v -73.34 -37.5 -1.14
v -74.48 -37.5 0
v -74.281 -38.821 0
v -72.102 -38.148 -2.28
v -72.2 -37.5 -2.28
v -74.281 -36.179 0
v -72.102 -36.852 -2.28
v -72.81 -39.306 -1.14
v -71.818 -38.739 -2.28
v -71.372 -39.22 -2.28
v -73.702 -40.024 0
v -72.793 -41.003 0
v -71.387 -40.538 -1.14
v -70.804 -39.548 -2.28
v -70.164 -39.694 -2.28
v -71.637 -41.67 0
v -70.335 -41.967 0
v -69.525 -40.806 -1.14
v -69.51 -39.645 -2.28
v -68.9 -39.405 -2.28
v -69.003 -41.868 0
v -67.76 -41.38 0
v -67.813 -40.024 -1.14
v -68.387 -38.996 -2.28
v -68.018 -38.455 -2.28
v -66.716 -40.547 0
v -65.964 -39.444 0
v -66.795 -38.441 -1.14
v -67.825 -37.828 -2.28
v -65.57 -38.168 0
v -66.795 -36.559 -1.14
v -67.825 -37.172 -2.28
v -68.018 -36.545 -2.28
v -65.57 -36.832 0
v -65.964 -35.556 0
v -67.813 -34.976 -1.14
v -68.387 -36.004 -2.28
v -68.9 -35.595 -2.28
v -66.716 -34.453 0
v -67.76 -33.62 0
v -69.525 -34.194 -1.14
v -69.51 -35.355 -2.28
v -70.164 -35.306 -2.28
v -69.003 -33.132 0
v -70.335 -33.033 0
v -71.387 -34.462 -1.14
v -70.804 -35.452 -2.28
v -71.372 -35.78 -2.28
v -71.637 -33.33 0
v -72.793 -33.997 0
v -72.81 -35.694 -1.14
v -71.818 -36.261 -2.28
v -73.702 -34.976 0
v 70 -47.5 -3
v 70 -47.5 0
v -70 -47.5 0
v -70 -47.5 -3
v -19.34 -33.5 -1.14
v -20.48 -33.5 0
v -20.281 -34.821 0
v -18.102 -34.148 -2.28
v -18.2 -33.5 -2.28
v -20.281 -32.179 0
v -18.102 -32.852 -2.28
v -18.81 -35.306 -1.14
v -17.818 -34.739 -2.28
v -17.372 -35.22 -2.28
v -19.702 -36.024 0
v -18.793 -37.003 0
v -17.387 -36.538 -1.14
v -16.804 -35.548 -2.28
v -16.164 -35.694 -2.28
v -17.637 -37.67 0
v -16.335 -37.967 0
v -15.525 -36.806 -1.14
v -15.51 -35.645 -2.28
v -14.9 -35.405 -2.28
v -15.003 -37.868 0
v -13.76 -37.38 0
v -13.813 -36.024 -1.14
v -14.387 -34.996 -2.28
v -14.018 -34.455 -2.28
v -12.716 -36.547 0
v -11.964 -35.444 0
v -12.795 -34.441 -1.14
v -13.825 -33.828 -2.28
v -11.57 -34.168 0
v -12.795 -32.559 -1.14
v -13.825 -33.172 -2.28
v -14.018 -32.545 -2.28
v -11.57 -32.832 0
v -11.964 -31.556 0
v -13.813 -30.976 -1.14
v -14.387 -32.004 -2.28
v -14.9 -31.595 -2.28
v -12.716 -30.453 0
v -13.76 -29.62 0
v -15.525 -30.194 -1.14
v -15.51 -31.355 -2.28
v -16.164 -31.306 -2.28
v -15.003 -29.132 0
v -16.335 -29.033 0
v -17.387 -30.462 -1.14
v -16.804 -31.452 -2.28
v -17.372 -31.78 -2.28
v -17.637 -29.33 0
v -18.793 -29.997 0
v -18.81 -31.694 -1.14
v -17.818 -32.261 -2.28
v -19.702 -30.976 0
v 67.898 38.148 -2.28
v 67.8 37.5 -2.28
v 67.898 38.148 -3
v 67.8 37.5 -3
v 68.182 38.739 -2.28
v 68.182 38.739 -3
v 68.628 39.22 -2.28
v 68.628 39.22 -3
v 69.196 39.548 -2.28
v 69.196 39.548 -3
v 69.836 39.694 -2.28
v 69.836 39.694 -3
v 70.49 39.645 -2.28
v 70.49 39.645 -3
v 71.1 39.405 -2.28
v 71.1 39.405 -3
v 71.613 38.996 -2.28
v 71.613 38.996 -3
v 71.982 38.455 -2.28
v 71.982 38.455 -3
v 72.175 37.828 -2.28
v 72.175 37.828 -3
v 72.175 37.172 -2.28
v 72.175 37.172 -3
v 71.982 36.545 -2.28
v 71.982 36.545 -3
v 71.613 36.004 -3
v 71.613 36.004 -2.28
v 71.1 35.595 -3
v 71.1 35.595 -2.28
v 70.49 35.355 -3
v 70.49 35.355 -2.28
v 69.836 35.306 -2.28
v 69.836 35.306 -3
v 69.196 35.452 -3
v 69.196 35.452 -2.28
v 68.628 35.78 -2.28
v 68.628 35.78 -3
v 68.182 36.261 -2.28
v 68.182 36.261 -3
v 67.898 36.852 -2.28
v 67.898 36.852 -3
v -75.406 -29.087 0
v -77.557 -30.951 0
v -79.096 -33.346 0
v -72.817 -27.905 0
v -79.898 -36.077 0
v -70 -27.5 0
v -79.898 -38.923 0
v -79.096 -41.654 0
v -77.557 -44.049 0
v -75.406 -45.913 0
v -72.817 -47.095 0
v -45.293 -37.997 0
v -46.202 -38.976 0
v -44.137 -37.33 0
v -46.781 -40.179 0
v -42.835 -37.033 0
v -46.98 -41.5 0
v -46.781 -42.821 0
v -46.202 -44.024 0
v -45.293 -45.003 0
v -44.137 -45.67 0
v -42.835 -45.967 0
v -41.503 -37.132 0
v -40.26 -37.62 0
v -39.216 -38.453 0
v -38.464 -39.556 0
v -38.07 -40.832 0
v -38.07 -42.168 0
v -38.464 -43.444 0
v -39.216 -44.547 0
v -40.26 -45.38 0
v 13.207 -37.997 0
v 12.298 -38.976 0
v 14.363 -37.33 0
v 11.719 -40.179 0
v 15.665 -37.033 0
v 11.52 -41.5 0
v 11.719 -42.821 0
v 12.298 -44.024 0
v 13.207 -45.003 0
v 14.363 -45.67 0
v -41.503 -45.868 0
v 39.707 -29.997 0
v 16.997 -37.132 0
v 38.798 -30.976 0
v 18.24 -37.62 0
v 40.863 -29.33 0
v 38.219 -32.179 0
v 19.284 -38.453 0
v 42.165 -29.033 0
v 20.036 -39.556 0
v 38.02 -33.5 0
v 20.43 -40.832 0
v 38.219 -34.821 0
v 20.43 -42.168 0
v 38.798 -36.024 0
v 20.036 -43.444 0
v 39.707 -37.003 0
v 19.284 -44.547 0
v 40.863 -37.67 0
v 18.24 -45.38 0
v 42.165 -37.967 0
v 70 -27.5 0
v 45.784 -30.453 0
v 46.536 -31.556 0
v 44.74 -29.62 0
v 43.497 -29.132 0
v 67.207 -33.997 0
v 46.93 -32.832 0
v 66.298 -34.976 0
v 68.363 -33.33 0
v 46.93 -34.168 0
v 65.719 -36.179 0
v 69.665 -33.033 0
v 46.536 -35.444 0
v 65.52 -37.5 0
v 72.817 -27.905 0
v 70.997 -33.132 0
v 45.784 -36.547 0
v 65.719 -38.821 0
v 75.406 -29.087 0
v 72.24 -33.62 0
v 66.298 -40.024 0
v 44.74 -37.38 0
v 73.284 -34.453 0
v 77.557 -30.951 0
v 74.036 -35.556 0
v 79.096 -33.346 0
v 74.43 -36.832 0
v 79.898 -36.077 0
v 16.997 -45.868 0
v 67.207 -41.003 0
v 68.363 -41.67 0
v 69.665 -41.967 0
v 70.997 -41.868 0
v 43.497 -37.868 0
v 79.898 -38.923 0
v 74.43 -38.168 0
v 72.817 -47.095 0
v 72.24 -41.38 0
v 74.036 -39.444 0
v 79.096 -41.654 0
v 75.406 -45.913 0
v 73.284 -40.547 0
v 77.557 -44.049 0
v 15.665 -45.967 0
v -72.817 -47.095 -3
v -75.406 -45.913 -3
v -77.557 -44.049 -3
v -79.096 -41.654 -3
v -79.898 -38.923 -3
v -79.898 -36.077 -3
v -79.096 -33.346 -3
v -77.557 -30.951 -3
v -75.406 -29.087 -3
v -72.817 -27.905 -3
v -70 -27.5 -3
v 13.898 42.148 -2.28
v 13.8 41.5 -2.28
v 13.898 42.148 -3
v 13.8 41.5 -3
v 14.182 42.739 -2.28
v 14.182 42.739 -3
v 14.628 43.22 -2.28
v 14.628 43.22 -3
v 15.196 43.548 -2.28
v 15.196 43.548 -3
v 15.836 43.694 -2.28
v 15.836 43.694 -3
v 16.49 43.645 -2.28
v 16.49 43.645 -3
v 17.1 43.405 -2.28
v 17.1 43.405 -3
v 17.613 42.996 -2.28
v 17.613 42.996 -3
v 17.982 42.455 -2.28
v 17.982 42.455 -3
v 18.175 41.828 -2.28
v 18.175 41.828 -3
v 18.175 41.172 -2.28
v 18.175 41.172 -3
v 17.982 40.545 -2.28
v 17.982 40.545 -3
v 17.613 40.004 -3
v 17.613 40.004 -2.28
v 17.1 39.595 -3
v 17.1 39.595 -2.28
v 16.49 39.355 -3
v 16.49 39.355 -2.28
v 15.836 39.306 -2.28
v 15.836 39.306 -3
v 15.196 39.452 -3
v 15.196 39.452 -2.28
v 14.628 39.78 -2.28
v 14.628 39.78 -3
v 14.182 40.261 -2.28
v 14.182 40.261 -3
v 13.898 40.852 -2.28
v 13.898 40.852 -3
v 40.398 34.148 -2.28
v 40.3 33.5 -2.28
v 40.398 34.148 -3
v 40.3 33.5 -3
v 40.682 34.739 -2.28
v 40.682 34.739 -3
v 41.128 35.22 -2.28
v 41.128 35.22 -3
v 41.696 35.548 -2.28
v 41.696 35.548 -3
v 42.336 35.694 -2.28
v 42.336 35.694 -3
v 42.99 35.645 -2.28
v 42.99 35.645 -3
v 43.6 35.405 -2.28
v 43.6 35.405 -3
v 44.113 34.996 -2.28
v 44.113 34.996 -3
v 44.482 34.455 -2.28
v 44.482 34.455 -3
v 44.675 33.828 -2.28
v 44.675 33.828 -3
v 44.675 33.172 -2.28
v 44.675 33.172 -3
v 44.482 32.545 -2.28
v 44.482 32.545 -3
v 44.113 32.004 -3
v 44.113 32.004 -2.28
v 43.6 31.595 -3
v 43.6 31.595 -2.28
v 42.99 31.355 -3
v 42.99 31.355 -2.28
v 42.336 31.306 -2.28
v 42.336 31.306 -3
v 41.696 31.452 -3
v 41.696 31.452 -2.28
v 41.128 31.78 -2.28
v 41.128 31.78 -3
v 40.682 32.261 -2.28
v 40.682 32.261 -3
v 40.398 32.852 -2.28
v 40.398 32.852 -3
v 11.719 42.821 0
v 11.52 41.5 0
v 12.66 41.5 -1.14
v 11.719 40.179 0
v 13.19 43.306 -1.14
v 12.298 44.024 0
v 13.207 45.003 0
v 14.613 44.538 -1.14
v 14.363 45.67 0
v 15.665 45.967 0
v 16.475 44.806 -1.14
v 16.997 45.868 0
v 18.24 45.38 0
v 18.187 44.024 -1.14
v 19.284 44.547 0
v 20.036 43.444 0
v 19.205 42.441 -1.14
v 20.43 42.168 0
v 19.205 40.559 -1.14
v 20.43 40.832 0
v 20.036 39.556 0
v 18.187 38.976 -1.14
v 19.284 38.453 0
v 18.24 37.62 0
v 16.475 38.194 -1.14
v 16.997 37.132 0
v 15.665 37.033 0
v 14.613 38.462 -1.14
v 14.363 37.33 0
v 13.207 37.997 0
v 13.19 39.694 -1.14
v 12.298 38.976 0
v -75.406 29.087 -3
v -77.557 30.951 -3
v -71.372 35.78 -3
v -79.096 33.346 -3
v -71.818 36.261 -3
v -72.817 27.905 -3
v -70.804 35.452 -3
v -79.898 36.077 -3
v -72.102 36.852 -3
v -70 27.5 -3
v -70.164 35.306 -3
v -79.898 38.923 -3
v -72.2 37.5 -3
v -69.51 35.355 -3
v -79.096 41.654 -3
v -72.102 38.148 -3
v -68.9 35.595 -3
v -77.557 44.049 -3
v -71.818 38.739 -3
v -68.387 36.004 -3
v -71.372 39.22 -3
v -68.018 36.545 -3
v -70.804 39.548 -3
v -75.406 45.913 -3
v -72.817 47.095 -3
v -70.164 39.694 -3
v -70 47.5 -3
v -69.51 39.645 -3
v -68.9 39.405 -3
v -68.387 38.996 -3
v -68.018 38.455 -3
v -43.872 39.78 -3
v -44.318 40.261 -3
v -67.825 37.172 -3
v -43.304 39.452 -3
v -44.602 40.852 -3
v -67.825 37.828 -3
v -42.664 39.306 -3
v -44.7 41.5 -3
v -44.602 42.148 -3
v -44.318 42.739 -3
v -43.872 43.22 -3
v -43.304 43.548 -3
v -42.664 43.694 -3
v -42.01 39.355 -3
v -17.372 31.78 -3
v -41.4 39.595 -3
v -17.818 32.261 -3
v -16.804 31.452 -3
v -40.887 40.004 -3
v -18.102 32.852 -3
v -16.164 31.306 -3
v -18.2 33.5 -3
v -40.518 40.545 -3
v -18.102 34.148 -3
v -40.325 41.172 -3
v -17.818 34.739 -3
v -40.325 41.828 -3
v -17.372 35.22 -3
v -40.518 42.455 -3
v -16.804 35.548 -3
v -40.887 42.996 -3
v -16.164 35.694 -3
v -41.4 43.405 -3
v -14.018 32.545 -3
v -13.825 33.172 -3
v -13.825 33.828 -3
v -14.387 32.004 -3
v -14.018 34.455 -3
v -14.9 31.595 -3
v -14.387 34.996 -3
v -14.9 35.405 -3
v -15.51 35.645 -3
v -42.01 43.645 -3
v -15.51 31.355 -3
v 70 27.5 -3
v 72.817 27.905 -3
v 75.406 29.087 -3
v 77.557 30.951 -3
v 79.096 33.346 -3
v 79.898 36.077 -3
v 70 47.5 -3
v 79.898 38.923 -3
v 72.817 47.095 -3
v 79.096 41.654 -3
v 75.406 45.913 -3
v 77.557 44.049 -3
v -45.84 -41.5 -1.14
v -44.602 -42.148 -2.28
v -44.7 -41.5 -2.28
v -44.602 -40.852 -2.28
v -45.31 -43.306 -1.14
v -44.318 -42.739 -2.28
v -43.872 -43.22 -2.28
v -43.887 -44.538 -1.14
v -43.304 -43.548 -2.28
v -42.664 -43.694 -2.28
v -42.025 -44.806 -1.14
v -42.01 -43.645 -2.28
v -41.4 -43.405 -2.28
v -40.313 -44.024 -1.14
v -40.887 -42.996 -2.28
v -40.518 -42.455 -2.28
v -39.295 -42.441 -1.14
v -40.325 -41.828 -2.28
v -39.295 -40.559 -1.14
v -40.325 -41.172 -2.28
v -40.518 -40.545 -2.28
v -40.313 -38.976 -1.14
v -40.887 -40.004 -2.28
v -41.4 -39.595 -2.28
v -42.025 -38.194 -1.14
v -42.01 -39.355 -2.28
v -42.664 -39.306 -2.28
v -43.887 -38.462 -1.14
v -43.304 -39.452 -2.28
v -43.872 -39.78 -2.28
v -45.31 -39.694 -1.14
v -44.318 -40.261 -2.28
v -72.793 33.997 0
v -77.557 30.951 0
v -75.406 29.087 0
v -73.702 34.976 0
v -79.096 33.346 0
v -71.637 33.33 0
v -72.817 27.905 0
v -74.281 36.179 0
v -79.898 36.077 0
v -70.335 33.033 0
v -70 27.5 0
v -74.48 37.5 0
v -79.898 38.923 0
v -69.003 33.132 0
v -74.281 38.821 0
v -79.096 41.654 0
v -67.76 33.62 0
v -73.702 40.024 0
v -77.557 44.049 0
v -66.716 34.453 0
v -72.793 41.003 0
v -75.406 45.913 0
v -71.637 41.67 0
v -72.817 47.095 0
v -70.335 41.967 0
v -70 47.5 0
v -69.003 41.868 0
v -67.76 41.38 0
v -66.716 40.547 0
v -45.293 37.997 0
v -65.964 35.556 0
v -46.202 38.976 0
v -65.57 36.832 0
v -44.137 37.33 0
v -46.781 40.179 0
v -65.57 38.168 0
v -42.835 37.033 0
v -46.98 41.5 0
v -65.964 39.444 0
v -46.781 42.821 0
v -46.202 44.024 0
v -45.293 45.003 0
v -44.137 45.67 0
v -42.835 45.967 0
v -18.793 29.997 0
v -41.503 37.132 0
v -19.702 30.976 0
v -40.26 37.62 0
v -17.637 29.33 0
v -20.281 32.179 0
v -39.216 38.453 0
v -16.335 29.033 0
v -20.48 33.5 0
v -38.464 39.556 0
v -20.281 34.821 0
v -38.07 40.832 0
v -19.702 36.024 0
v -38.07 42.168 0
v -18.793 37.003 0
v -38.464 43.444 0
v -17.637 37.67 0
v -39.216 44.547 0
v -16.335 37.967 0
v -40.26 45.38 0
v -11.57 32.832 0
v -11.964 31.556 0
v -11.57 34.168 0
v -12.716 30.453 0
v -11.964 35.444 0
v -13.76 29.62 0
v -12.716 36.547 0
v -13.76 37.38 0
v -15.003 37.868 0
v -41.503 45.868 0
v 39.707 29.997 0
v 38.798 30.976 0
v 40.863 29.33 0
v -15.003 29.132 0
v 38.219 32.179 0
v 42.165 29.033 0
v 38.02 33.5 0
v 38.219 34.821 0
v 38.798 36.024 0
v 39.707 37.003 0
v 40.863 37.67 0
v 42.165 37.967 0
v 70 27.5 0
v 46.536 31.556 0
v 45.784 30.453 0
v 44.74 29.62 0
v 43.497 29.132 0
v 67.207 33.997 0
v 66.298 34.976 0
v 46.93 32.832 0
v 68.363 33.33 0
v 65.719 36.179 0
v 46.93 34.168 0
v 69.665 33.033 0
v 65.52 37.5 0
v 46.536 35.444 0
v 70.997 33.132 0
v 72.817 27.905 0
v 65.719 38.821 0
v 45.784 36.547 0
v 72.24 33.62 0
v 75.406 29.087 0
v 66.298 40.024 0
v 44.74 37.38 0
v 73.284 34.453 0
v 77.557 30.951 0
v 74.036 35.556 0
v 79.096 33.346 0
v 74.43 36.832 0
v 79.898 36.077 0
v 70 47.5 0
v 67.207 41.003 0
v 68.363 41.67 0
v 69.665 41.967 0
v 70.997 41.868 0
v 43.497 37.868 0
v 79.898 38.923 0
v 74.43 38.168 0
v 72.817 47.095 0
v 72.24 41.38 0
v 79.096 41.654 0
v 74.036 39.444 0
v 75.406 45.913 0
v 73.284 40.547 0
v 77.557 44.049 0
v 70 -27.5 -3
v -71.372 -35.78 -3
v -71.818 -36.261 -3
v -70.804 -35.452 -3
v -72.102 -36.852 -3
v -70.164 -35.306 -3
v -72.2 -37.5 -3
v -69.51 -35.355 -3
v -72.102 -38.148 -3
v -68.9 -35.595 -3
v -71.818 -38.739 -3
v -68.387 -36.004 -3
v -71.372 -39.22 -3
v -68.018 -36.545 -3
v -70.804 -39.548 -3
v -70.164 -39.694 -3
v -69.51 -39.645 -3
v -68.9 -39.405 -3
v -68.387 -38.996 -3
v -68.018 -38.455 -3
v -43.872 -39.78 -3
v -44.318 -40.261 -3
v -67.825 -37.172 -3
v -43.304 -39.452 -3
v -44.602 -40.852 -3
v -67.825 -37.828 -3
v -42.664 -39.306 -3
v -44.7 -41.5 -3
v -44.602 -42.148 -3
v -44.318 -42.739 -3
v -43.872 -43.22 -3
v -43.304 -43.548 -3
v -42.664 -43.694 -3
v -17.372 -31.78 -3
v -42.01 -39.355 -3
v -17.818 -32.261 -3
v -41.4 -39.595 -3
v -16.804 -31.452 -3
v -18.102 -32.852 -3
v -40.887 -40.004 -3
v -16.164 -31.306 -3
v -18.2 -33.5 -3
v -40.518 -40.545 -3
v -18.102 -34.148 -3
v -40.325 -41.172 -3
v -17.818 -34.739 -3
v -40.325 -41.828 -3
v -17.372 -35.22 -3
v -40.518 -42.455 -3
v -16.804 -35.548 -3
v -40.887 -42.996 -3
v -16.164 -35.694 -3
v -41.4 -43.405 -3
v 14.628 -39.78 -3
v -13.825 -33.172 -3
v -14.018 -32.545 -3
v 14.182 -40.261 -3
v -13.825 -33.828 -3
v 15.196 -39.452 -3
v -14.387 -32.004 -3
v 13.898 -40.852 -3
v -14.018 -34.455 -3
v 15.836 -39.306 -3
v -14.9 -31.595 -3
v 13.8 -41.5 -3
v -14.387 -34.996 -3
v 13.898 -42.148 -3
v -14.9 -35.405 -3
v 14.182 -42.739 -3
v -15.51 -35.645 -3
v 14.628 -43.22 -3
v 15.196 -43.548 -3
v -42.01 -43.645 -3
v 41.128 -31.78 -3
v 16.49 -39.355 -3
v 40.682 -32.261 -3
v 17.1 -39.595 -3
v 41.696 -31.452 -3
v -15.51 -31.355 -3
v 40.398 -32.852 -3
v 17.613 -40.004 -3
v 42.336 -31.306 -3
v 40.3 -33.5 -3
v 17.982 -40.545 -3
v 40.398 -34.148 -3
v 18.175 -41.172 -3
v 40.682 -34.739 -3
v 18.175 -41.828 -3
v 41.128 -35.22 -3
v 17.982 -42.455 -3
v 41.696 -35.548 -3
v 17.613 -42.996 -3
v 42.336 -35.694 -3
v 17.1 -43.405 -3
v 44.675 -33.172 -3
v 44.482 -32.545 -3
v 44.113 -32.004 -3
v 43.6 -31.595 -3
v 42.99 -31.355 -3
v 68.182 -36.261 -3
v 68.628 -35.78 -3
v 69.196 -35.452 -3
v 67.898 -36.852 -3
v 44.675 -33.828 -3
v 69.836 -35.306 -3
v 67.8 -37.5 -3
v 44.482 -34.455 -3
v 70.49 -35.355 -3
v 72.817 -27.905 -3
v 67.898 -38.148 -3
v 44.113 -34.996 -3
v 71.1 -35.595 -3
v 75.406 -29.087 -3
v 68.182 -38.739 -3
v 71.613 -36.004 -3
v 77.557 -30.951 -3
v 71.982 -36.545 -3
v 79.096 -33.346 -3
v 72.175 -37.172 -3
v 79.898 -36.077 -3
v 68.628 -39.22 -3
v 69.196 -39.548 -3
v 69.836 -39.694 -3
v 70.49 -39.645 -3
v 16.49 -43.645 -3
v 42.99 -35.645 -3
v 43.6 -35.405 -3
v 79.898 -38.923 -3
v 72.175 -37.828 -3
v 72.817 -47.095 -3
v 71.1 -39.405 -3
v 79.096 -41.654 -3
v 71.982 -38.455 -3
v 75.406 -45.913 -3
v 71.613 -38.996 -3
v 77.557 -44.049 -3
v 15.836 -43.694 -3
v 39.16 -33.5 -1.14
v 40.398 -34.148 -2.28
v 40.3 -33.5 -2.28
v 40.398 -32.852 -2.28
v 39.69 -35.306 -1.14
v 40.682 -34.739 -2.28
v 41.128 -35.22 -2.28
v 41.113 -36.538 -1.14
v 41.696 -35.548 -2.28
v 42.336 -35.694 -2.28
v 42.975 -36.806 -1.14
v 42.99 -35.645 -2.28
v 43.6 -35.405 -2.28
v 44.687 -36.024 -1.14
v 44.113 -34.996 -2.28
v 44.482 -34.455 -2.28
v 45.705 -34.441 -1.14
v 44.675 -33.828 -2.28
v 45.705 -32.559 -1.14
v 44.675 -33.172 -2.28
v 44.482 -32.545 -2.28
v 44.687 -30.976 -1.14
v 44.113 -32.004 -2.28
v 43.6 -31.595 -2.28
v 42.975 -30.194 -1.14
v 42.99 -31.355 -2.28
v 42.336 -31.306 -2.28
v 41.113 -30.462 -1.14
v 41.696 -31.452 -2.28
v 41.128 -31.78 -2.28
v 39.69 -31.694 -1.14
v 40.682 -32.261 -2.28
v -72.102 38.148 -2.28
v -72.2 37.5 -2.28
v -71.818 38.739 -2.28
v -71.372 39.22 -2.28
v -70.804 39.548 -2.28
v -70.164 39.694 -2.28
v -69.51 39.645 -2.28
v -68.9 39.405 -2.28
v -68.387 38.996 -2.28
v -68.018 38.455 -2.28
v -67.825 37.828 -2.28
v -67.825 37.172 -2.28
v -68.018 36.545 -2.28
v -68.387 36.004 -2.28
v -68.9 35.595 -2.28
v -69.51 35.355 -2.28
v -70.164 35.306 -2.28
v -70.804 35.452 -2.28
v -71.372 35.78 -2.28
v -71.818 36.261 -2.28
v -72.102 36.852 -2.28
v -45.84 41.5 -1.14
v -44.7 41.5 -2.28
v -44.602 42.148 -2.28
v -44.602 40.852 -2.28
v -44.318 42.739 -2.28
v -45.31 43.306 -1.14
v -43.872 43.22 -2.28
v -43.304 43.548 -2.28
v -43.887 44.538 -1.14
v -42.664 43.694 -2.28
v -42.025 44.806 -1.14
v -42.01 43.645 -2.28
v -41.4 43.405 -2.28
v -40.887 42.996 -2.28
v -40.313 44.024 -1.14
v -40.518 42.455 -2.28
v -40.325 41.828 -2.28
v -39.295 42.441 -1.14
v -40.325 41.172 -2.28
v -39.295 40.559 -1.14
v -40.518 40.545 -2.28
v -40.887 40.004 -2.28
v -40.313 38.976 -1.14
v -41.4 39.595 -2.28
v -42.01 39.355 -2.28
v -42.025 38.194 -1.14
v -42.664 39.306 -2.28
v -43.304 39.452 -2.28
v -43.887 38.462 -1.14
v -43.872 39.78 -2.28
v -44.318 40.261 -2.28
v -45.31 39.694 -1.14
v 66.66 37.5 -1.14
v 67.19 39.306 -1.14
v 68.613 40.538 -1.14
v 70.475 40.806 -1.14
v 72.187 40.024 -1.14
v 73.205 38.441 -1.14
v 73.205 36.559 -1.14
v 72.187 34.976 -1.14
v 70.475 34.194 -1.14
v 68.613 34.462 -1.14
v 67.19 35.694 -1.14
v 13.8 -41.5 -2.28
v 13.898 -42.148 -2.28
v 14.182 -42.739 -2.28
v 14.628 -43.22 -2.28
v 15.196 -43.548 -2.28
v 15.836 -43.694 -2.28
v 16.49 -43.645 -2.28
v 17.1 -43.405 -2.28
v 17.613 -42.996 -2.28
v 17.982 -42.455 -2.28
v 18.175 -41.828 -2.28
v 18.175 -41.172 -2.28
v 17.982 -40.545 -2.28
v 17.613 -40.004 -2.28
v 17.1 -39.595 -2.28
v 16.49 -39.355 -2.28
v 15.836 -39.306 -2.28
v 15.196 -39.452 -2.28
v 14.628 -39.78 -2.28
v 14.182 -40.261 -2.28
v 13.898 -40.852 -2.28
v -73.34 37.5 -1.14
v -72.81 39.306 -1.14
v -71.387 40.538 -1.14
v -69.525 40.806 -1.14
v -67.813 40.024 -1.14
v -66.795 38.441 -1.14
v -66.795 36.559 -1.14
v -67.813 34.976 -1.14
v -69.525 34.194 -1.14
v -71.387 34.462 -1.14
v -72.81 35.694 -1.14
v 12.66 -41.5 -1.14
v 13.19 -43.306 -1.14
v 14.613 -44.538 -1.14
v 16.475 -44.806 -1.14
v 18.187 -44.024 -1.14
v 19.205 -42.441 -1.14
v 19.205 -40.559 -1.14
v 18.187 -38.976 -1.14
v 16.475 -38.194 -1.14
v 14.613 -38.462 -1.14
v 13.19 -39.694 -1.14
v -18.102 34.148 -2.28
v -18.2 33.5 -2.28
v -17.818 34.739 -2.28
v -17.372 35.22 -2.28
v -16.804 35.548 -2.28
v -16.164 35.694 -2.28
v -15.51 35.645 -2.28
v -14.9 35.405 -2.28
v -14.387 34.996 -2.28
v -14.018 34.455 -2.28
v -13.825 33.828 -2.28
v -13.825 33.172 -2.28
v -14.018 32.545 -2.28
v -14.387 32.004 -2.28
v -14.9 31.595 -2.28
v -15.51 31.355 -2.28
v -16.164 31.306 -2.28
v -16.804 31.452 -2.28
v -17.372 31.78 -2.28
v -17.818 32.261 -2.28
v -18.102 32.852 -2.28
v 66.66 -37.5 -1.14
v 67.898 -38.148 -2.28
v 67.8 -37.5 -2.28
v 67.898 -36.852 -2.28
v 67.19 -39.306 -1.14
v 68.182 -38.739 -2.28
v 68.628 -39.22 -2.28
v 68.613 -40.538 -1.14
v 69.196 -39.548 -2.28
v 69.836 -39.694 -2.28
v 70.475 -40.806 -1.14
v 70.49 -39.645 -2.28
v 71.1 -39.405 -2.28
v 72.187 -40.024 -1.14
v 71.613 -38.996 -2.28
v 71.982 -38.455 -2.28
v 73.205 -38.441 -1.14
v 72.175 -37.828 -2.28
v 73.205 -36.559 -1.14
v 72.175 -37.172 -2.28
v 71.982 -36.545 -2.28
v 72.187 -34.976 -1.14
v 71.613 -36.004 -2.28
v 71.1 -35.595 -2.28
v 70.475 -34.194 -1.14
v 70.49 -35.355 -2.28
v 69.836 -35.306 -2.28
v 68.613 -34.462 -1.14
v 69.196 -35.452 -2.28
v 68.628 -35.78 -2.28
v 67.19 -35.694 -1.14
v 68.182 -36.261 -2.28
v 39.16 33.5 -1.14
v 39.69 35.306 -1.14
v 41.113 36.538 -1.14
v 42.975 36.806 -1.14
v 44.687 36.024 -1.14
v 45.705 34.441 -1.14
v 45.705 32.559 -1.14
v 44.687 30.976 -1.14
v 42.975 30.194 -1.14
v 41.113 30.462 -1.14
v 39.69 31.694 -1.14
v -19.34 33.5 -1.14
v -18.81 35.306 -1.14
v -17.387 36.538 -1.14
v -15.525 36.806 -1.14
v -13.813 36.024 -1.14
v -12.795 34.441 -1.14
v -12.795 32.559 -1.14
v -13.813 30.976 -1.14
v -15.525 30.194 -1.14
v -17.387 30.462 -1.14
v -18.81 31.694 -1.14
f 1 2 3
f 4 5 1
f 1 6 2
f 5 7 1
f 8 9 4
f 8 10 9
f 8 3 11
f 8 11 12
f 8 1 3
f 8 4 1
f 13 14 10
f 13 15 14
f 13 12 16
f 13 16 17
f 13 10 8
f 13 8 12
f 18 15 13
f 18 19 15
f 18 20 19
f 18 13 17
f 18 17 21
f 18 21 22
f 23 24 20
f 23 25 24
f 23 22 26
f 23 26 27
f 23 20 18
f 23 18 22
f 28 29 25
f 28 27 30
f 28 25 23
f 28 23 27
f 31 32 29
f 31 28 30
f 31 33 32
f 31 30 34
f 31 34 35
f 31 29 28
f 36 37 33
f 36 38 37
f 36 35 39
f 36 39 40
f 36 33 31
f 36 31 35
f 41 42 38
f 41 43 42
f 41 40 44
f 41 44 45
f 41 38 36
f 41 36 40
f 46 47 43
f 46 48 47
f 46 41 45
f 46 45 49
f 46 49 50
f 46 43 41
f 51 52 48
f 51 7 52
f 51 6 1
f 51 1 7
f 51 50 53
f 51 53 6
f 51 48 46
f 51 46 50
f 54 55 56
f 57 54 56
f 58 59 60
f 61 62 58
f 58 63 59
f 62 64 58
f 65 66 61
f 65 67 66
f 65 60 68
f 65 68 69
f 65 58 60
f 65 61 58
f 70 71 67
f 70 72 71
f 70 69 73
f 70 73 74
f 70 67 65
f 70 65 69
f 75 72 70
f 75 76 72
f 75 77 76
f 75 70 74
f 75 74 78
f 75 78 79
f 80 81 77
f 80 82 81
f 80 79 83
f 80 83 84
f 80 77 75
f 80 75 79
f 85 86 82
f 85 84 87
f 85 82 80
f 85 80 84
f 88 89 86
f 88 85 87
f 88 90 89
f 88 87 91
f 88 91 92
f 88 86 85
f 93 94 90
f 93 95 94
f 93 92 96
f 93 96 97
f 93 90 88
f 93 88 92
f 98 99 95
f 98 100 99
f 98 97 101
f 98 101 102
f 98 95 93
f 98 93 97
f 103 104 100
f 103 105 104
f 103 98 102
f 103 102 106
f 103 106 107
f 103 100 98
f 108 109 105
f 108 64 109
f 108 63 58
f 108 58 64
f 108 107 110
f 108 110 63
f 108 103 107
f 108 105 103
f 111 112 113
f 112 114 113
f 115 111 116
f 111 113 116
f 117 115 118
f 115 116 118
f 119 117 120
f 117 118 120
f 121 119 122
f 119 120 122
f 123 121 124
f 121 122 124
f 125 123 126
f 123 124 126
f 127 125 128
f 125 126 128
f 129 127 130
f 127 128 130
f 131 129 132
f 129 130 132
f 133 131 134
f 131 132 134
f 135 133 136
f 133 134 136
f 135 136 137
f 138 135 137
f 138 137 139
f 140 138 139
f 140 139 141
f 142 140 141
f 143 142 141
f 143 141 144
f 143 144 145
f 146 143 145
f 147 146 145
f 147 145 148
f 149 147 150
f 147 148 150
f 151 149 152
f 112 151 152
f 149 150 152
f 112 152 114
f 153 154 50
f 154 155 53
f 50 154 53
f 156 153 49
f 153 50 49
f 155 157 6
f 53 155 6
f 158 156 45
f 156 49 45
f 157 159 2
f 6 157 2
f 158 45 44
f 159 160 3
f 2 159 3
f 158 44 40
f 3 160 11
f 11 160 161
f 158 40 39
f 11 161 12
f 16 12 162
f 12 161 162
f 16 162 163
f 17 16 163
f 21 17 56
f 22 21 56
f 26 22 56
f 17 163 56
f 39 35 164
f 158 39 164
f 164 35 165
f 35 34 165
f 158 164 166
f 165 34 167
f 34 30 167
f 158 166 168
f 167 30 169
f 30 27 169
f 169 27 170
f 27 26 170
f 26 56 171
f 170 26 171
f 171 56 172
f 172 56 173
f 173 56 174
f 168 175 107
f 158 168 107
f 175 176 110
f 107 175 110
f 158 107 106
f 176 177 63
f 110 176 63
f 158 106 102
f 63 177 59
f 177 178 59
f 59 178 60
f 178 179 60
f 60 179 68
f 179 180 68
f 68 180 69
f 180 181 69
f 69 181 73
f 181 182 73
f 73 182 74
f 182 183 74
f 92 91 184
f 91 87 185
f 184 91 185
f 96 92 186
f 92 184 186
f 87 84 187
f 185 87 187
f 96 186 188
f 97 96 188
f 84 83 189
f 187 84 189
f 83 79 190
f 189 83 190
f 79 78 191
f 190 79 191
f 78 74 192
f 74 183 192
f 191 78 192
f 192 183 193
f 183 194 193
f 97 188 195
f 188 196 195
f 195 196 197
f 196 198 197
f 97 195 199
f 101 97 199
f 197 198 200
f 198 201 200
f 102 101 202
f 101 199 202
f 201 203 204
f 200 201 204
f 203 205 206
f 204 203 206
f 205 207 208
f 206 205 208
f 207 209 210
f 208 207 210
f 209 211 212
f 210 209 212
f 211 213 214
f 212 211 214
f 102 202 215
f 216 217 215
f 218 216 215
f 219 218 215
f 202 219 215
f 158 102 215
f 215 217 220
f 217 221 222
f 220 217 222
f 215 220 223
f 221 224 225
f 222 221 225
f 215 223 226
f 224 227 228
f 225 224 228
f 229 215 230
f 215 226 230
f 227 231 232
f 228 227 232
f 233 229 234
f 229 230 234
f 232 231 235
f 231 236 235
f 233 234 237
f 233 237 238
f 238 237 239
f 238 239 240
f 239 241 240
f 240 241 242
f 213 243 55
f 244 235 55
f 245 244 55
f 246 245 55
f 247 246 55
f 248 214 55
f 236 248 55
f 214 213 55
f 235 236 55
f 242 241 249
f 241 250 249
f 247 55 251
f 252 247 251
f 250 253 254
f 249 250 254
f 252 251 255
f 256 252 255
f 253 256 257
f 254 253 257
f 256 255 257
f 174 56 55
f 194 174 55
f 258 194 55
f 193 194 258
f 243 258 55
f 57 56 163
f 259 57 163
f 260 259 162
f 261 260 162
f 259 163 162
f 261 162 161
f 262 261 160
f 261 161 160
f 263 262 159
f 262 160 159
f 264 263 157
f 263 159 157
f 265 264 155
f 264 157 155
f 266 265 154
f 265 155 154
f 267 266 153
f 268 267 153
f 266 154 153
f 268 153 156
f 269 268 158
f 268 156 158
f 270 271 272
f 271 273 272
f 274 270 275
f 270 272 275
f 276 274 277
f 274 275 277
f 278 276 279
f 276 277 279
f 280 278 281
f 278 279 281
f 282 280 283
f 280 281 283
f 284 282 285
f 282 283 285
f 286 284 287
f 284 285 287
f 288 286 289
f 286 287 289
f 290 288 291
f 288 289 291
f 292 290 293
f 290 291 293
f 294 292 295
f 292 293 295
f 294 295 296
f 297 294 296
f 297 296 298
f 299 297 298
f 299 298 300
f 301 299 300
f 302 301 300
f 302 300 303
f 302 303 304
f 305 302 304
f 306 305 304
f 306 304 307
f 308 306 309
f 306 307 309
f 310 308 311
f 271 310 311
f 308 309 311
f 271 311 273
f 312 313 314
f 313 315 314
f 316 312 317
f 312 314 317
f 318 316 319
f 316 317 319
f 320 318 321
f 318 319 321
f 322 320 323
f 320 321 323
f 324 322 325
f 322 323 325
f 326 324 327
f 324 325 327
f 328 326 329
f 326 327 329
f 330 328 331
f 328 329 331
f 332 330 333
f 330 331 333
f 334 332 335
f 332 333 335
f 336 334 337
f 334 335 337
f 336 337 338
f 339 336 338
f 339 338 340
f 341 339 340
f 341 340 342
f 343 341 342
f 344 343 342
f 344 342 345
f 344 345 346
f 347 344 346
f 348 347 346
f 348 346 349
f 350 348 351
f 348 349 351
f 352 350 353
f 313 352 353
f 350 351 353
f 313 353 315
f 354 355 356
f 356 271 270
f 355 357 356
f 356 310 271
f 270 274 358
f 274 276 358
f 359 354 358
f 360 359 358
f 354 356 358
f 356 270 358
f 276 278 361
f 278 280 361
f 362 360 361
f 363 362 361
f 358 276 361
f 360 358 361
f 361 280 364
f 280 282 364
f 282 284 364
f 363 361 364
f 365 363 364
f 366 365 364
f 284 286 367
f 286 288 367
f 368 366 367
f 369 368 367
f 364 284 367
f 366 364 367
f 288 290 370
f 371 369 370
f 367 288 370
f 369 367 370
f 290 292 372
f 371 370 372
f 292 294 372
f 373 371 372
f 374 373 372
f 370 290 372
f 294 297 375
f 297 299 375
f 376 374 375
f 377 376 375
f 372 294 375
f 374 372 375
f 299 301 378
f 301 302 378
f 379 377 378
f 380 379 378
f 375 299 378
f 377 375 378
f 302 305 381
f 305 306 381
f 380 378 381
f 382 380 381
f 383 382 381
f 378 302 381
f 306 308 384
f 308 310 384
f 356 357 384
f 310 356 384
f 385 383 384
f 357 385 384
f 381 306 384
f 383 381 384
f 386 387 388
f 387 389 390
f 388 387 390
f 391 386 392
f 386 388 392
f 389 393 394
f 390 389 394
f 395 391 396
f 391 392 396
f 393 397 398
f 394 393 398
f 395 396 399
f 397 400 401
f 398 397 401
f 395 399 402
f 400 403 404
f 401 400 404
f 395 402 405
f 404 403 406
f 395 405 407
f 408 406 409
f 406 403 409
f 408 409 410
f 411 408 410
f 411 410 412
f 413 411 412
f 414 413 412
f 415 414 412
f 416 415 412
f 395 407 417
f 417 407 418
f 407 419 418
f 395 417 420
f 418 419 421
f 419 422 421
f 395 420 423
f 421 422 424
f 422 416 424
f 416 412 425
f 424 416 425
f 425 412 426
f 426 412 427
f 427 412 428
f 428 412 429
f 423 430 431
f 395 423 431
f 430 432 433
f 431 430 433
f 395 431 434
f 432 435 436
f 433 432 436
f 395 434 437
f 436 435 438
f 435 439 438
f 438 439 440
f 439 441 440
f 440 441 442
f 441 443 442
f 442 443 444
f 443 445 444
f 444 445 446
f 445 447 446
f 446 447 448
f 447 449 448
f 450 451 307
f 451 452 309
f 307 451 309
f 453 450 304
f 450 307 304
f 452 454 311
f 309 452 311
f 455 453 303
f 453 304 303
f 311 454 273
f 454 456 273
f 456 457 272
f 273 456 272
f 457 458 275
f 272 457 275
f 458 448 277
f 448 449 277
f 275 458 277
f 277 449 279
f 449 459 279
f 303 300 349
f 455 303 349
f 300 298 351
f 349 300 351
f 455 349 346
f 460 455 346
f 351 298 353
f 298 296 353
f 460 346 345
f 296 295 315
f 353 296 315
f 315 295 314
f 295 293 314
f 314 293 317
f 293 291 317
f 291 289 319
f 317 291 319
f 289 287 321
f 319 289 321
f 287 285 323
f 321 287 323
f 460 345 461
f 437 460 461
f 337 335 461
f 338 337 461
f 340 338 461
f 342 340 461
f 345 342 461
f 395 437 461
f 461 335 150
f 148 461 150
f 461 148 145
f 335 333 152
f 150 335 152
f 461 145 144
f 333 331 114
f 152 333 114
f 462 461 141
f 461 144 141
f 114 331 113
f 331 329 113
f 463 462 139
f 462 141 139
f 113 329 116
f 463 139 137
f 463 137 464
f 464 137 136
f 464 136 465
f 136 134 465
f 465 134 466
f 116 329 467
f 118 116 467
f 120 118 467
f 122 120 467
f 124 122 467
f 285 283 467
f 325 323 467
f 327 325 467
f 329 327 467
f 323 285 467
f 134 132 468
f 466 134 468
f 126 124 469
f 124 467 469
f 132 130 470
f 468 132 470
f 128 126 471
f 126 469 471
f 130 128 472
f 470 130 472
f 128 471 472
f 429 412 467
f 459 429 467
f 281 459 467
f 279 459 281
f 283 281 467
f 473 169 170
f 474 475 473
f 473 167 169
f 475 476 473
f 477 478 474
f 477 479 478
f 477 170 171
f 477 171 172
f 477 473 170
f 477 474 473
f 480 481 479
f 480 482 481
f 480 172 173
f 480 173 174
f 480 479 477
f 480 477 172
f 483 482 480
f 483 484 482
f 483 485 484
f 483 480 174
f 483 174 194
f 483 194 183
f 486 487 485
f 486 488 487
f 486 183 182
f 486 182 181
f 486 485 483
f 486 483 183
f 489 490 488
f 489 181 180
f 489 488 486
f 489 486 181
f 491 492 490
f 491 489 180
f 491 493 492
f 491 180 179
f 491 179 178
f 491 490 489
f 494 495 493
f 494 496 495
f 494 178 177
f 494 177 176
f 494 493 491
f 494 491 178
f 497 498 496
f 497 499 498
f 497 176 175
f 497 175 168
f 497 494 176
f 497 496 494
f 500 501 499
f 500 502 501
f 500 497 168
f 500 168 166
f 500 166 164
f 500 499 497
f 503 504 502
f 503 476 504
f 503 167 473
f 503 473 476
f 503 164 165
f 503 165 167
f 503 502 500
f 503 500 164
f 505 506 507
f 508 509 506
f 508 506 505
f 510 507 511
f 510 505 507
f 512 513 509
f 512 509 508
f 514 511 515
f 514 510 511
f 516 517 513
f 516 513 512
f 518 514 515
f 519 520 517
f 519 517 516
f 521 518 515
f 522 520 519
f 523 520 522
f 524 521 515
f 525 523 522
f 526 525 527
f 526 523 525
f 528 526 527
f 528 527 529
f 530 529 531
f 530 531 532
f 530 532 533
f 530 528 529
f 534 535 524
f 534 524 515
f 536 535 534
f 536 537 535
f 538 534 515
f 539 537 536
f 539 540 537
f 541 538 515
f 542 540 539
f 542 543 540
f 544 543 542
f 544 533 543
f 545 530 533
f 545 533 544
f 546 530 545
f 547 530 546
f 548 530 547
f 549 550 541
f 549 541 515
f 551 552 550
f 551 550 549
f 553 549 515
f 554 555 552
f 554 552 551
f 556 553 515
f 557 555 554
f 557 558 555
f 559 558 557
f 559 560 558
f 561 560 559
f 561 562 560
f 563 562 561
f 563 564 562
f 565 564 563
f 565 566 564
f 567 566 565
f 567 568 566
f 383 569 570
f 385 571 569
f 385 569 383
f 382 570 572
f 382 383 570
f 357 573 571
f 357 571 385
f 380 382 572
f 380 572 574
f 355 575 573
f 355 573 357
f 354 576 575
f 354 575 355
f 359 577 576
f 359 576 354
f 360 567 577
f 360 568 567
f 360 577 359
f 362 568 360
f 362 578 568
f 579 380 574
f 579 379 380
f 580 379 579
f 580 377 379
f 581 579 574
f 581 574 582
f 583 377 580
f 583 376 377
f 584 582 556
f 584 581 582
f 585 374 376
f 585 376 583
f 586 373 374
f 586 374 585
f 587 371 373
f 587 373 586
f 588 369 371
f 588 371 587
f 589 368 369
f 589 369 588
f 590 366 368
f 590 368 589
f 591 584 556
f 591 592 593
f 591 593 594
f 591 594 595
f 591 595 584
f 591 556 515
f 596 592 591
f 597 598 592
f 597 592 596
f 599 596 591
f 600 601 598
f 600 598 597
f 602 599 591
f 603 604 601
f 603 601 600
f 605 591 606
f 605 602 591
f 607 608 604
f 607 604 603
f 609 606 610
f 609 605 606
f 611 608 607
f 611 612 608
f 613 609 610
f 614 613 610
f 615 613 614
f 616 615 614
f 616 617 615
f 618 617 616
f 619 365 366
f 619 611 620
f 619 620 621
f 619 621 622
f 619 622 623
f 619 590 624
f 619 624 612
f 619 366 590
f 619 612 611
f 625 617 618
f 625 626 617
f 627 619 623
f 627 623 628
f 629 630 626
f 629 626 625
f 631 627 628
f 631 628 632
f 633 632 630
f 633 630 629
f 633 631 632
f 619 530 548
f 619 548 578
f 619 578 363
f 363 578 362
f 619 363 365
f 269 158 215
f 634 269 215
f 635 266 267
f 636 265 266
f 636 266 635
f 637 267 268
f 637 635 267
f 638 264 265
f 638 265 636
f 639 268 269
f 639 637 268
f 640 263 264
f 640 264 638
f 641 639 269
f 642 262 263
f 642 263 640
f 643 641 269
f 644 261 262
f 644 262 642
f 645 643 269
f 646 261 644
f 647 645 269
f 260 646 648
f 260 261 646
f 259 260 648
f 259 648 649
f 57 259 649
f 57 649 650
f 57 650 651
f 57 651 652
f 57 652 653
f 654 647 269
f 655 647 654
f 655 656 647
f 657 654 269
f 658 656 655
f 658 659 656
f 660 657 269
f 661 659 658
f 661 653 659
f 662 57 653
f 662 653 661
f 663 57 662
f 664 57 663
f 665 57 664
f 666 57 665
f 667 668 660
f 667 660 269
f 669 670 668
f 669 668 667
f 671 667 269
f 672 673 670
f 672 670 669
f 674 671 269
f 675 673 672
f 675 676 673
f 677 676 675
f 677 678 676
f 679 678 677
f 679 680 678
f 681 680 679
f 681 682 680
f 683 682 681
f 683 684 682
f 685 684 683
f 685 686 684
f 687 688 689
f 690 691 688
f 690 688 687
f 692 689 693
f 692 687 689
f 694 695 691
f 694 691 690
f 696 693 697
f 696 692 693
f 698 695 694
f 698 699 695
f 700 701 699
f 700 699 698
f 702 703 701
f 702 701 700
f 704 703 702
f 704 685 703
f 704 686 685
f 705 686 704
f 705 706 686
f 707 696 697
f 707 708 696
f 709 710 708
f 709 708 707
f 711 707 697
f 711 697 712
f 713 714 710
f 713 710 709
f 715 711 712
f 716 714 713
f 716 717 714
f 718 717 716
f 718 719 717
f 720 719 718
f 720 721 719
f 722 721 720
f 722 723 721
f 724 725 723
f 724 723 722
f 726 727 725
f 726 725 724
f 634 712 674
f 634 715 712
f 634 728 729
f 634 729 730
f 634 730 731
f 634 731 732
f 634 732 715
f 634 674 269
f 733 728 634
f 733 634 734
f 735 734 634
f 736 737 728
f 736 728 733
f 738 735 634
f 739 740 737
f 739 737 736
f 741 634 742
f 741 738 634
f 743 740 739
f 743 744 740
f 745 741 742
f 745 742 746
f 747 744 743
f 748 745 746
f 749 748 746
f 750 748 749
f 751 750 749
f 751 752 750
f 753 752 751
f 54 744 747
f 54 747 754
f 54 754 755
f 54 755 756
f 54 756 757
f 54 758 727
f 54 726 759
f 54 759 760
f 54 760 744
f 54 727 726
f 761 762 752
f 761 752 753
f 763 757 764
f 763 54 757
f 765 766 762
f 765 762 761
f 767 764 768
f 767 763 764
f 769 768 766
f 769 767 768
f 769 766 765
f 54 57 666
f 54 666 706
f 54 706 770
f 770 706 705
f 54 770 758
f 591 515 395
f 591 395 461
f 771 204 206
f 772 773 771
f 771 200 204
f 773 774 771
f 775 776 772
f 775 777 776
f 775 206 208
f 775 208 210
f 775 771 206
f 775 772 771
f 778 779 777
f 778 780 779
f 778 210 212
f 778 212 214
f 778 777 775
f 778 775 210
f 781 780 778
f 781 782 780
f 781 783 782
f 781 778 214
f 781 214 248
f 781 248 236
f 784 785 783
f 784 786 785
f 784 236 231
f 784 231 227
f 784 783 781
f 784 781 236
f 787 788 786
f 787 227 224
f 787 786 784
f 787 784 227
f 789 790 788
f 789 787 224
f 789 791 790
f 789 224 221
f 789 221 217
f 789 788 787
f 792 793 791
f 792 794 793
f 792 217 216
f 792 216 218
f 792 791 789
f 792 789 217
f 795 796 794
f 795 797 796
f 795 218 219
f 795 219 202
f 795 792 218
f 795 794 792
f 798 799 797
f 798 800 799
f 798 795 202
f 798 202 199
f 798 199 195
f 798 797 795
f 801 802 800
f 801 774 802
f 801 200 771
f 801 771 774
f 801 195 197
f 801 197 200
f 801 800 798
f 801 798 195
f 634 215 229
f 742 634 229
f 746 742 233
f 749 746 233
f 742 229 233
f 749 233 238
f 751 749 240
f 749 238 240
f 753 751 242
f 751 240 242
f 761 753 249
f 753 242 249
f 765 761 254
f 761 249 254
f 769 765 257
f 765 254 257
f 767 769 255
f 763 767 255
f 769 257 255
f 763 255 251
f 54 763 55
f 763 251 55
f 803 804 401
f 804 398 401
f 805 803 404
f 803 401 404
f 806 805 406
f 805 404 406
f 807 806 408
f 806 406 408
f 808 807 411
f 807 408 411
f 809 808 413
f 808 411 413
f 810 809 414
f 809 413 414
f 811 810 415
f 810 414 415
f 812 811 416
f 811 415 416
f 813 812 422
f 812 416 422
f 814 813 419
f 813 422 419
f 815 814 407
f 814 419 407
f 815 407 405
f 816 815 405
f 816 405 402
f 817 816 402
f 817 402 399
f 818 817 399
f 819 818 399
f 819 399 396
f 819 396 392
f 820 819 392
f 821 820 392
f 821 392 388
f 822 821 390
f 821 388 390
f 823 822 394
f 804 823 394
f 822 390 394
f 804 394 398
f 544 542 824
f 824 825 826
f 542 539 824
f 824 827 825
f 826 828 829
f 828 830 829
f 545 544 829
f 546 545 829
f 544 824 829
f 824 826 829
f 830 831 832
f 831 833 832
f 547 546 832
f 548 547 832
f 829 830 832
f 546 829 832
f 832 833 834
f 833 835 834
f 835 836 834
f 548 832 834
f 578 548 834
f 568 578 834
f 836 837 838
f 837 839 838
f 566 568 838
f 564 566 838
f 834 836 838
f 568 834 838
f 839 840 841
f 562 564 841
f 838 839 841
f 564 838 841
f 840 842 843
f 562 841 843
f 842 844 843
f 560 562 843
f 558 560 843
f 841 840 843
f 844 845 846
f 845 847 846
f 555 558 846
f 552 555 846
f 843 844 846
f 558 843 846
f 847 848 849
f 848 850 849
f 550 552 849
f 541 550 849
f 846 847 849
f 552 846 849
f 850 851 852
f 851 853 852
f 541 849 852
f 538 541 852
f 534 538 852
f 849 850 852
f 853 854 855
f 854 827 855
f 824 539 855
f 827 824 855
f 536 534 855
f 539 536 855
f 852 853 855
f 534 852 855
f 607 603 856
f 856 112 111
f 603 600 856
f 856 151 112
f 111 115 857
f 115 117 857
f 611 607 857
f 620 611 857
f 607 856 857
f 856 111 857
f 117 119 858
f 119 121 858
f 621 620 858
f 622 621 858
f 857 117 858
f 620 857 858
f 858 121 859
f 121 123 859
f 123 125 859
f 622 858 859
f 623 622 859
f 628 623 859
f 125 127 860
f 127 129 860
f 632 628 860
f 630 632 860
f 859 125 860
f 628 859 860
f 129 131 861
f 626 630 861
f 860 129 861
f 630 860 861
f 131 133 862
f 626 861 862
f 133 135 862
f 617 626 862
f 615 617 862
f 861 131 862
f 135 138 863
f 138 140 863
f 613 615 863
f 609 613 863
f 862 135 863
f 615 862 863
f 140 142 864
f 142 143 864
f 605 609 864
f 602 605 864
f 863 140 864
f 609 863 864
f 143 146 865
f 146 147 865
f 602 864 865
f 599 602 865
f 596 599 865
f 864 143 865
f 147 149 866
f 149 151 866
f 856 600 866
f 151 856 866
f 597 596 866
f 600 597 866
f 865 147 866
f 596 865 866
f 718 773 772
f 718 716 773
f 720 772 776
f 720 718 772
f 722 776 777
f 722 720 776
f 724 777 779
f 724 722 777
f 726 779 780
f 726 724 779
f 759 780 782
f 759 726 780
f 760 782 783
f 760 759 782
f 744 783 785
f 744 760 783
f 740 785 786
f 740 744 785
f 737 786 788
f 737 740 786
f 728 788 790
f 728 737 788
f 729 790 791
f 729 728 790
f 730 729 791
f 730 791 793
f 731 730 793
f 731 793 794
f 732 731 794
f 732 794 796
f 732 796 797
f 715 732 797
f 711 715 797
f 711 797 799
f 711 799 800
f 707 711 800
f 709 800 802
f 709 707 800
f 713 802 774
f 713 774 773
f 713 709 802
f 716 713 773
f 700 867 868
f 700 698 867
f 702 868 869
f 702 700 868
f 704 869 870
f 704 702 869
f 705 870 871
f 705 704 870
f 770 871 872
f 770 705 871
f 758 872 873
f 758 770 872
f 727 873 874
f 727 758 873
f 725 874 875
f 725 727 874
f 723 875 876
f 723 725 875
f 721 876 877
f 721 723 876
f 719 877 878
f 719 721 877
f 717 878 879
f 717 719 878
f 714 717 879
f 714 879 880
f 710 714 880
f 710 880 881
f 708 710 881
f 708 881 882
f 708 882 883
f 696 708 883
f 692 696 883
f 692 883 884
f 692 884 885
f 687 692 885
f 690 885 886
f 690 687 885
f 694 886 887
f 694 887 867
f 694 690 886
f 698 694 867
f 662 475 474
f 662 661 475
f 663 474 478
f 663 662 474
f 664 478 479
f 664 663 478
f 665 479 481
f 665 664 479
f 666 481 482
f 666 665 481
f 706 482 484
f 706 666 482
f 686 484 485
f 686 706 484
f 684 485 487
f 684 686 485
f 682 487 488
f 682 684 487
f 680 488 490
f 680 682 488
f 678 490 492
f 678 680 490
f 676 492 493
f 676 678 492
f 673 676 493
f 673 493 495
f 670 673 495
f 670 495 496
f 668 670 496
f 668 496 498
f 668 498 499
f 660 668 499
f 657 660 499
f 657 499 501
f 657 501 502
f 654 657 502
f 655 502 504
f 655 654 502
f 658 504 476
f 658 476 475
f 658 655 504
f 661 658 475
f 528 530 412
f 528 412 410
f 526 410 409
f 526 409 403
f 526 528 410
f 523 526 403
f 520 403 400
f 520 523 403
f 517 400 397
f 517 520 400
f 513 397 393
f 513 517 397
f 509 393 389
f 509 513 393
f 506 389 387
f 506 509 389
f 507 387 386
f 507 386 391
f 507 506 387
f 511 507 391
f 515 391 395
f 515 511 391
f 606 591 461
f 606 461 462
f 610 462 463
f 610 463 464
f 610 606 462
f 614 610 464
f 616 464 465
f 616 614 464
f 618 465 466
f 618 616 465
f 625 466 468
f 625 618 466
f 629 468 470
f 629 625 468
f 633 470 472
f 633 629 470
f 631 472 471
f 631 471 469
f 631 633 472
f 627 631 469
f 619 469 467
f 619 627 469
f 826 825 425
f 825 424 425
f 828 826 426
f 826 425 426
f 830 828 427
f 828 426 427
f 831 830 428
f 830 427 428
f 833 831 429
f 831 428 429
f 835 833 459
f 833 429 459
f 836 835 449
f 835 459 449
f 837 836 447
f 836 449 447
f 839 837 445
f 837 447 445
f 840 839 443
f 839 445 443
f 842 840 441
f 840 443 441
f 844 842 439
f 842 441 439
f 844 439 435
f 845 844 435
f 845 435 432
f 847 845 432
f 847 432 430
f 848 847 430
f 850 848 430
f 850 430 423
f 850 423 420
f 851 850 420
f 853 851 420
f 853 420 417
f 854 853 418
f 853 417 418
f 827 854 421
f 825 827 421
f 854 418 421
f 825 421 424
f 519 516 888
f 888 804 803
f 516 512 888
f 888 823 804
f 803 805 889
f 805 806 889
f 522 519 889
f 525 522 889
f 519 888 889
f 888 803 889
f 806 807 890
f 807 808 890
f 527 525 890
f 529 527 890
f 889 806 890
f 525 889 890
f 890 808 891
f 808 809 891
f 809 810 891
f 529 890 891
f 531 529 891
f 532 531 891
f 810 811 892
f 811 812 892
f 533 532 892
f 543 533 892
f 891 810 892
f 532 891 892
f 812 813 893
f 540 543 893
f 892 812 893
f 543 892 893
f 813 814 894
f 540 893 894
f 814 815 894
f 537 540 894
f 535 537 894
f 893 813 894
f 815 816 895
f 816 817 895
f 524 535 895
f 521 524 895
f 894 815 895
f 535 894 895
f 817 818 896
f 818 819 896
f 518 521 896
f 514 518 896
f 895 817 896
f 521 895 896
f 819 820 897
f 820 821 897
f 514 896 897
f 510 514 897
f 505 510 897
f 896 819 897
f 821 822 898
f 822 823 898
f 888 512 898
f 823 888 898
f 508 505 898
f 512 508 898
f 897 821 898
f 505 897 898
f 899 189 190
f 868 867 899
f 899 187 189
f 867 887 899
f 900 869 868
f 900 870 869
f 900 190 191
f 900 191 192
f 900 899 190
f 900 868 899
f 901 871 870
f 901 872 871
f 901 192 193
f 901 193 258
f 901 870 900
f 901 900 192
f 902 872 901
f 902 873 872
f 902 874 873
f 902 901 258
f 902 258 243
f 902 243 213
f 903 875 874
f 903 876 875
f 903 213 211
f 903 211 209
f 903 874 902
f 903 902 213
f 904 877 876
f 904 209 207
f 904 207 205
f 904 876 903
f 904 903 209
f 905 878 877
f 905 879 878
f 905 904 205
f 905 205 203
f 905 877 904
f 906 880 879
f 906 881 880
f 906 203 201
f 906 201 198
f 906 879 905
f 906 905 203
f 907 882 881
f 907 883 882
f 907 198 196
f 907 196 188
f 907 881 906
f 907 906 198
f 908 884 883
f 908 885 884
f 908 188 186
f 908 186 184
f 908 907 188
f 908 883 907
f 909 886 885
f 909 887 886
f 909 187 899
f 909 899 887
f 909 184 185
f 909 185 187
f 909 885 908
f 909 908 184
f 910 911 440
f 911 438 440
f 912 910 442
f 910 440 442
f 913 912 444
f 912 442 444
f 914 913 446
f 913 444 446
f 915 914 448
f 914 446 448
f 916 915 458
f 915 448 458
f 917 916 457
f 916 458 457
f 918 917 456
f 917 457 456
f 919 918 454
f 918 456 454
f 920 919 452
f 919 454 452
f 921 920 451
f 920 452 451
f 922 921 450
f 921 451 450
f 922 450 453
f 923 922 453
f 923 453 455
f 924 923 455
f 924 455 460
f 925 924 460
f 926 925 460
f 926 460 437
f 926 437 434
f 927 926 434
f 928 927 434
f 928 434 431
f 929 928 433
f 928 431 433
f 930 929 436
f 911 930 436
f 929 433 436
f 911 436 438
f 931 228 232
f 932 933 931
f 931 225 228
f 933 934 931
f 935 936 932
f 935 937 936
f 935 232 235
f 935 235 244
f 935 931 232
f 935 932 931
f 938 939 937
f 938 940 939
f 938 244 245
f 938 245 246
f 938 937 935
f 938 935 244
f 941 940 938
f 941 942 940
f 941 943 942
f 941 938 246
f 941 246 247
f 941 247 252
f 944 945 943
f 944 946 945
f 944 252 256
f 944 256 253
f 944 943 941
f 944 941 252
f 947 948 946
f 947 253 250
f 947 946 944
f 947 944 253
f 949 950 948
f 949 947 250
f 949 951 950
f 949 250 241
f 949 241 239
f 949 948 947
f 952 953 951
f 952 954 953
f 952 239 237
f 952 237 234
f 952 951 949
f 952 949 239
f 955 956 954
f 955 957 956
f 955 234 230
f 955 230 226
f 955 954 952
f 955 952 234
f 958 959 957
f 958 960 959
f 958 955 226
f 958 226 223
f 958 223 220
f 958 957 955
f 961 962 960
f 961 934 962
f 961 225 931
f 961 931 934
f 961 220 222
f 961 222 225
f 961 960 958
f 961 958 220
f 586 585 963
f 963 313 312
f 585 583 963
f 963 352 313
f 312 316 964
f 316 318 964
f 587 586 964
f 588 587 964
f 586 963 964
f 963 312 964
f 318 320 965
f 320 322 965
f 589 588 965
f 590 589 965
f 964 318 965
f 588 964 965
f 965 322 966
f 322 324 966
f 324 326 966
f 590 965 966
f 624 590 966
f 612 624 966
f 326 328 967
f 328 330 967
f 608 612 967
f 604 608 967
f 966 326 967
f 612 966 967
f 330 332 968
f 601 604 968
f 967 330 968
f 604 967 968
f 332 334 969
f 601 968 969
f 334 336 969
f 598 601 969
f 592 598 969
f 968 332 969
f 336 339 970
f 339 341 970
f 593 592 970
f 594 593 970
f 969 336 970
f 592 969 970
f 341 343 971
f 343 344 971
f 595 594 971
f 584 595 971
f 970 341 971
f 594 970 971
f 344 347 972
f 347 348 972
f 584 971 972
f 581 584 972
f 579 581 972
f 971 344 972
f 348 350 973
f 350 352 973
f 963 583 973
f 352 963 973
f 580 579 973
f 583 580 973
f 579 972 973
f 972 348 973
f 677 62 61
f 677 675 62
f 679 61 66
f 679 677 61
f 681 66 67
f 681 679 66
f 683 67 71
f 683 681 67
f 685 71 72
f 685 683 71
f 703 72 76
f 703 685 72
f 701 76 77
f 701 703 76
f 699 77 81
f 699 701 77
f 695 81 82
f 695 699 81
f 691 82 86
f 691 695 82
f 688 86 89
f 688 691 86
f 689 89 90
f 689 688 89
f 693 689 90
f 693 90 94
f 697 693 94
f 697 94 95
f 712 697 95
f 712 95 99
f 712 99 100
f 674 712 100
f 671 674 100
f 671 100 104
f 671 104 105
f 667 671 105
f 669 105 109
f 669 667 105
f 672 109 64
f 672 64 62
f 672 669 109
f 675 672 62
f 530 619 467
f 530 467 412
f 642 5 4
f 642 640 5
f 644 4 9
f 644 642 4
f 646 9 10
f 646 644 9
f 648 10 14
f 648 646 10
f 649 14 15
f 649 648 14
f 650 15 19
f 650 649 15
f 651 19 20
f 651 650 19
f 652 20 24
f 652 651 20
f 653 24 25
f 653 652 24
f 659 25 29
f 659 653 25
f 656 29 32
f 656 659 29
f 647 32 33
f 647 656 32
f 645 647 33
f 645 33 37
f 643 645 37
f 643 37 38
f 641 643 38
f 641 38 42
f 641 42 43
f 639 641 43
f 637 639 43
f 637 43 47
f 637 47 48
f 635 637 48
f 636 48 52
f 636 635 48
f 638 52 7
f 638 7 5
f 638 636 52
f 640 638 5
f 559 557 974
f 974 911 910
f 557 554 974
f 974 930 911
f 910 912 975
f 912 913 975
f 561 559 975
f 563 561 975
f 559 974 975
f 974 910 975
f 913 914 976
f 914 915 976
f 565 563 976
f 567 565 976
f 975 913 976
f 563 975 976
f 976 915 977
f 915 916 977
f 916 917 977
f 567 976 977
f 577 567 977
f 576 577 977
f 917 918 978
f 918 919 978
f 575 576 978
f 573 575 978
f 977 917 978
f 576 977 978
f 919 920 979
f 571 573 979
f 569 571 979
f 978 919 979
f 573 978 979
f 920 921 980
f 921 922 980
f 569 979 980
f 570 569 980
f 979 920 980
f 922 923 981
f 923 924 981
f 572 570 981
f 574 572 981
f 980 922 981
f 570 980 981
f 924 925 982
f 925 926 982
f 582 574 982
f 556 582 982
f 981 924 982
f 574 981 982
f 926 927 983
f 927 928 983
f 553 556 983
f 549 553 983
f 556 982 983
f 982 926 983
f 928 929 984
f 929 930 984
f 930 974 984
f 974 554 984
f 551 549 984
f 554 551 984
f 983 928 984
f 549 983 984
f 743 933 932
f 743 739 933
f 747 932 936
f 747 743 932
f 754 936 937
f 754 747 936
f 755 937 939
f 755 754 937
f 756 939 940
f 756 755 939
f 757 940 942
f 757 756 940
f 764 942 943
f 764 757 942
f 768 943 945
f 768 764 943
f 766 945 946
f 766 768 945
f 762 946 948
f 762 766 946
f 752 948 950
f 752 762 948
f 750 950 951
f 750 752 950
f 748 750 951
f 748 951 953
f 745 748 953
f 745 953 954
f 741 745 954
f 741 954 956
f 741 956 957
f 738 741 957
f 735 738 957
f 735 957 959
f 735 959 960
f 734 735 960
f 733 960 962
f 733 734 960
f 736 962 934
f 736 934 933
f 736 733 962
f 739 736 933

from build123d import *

# Parameters (mm, degrees)
F1_DEPTH       = 3
F2_D           = 4.4
F2_CSINK_D     = 8.96
F2_CSINK_ANGLE = 90


# Not quite as in the source:
# - a feature names something its author has since deleted; it is built from what else it names


with BuildPart() as f1:
    # F0 (on Top) → F1 (new body)
    with BuildSketch(Plane.XY):
        with BuildLine():
            ThreePointArc((70, 27.5), (80, 37.5), (70, 47.5))
            Line((70, 47.5), (-70, 47.5))
            ThreePointArc((-70, 47.5), (-80, 37.5), (-70, 27.5))
            Line((-70, 27.5), (70, 27.5))
        make_face()
    extrude(amount=-F1_DEPTH)

    # F2 (through all)
    with Locations(Plane.XY):
        with Locations((-70, 37.5), (-42.5, 41.5), (-16, 33.5), (16, 41.5), (42.5, 33.5), (70, 37.5)):
            CounterSinkHole(F2_D / 2, F2_CSINK_D / 2, counter_sink_angle=F2_CSINK_ANGLE)


with BuildPart() as f3_1:
    # F3: instance of F1
    add(f1.part.mirror(Plane.XZ))


solid = Compound([f1.part, f3_1.part])
